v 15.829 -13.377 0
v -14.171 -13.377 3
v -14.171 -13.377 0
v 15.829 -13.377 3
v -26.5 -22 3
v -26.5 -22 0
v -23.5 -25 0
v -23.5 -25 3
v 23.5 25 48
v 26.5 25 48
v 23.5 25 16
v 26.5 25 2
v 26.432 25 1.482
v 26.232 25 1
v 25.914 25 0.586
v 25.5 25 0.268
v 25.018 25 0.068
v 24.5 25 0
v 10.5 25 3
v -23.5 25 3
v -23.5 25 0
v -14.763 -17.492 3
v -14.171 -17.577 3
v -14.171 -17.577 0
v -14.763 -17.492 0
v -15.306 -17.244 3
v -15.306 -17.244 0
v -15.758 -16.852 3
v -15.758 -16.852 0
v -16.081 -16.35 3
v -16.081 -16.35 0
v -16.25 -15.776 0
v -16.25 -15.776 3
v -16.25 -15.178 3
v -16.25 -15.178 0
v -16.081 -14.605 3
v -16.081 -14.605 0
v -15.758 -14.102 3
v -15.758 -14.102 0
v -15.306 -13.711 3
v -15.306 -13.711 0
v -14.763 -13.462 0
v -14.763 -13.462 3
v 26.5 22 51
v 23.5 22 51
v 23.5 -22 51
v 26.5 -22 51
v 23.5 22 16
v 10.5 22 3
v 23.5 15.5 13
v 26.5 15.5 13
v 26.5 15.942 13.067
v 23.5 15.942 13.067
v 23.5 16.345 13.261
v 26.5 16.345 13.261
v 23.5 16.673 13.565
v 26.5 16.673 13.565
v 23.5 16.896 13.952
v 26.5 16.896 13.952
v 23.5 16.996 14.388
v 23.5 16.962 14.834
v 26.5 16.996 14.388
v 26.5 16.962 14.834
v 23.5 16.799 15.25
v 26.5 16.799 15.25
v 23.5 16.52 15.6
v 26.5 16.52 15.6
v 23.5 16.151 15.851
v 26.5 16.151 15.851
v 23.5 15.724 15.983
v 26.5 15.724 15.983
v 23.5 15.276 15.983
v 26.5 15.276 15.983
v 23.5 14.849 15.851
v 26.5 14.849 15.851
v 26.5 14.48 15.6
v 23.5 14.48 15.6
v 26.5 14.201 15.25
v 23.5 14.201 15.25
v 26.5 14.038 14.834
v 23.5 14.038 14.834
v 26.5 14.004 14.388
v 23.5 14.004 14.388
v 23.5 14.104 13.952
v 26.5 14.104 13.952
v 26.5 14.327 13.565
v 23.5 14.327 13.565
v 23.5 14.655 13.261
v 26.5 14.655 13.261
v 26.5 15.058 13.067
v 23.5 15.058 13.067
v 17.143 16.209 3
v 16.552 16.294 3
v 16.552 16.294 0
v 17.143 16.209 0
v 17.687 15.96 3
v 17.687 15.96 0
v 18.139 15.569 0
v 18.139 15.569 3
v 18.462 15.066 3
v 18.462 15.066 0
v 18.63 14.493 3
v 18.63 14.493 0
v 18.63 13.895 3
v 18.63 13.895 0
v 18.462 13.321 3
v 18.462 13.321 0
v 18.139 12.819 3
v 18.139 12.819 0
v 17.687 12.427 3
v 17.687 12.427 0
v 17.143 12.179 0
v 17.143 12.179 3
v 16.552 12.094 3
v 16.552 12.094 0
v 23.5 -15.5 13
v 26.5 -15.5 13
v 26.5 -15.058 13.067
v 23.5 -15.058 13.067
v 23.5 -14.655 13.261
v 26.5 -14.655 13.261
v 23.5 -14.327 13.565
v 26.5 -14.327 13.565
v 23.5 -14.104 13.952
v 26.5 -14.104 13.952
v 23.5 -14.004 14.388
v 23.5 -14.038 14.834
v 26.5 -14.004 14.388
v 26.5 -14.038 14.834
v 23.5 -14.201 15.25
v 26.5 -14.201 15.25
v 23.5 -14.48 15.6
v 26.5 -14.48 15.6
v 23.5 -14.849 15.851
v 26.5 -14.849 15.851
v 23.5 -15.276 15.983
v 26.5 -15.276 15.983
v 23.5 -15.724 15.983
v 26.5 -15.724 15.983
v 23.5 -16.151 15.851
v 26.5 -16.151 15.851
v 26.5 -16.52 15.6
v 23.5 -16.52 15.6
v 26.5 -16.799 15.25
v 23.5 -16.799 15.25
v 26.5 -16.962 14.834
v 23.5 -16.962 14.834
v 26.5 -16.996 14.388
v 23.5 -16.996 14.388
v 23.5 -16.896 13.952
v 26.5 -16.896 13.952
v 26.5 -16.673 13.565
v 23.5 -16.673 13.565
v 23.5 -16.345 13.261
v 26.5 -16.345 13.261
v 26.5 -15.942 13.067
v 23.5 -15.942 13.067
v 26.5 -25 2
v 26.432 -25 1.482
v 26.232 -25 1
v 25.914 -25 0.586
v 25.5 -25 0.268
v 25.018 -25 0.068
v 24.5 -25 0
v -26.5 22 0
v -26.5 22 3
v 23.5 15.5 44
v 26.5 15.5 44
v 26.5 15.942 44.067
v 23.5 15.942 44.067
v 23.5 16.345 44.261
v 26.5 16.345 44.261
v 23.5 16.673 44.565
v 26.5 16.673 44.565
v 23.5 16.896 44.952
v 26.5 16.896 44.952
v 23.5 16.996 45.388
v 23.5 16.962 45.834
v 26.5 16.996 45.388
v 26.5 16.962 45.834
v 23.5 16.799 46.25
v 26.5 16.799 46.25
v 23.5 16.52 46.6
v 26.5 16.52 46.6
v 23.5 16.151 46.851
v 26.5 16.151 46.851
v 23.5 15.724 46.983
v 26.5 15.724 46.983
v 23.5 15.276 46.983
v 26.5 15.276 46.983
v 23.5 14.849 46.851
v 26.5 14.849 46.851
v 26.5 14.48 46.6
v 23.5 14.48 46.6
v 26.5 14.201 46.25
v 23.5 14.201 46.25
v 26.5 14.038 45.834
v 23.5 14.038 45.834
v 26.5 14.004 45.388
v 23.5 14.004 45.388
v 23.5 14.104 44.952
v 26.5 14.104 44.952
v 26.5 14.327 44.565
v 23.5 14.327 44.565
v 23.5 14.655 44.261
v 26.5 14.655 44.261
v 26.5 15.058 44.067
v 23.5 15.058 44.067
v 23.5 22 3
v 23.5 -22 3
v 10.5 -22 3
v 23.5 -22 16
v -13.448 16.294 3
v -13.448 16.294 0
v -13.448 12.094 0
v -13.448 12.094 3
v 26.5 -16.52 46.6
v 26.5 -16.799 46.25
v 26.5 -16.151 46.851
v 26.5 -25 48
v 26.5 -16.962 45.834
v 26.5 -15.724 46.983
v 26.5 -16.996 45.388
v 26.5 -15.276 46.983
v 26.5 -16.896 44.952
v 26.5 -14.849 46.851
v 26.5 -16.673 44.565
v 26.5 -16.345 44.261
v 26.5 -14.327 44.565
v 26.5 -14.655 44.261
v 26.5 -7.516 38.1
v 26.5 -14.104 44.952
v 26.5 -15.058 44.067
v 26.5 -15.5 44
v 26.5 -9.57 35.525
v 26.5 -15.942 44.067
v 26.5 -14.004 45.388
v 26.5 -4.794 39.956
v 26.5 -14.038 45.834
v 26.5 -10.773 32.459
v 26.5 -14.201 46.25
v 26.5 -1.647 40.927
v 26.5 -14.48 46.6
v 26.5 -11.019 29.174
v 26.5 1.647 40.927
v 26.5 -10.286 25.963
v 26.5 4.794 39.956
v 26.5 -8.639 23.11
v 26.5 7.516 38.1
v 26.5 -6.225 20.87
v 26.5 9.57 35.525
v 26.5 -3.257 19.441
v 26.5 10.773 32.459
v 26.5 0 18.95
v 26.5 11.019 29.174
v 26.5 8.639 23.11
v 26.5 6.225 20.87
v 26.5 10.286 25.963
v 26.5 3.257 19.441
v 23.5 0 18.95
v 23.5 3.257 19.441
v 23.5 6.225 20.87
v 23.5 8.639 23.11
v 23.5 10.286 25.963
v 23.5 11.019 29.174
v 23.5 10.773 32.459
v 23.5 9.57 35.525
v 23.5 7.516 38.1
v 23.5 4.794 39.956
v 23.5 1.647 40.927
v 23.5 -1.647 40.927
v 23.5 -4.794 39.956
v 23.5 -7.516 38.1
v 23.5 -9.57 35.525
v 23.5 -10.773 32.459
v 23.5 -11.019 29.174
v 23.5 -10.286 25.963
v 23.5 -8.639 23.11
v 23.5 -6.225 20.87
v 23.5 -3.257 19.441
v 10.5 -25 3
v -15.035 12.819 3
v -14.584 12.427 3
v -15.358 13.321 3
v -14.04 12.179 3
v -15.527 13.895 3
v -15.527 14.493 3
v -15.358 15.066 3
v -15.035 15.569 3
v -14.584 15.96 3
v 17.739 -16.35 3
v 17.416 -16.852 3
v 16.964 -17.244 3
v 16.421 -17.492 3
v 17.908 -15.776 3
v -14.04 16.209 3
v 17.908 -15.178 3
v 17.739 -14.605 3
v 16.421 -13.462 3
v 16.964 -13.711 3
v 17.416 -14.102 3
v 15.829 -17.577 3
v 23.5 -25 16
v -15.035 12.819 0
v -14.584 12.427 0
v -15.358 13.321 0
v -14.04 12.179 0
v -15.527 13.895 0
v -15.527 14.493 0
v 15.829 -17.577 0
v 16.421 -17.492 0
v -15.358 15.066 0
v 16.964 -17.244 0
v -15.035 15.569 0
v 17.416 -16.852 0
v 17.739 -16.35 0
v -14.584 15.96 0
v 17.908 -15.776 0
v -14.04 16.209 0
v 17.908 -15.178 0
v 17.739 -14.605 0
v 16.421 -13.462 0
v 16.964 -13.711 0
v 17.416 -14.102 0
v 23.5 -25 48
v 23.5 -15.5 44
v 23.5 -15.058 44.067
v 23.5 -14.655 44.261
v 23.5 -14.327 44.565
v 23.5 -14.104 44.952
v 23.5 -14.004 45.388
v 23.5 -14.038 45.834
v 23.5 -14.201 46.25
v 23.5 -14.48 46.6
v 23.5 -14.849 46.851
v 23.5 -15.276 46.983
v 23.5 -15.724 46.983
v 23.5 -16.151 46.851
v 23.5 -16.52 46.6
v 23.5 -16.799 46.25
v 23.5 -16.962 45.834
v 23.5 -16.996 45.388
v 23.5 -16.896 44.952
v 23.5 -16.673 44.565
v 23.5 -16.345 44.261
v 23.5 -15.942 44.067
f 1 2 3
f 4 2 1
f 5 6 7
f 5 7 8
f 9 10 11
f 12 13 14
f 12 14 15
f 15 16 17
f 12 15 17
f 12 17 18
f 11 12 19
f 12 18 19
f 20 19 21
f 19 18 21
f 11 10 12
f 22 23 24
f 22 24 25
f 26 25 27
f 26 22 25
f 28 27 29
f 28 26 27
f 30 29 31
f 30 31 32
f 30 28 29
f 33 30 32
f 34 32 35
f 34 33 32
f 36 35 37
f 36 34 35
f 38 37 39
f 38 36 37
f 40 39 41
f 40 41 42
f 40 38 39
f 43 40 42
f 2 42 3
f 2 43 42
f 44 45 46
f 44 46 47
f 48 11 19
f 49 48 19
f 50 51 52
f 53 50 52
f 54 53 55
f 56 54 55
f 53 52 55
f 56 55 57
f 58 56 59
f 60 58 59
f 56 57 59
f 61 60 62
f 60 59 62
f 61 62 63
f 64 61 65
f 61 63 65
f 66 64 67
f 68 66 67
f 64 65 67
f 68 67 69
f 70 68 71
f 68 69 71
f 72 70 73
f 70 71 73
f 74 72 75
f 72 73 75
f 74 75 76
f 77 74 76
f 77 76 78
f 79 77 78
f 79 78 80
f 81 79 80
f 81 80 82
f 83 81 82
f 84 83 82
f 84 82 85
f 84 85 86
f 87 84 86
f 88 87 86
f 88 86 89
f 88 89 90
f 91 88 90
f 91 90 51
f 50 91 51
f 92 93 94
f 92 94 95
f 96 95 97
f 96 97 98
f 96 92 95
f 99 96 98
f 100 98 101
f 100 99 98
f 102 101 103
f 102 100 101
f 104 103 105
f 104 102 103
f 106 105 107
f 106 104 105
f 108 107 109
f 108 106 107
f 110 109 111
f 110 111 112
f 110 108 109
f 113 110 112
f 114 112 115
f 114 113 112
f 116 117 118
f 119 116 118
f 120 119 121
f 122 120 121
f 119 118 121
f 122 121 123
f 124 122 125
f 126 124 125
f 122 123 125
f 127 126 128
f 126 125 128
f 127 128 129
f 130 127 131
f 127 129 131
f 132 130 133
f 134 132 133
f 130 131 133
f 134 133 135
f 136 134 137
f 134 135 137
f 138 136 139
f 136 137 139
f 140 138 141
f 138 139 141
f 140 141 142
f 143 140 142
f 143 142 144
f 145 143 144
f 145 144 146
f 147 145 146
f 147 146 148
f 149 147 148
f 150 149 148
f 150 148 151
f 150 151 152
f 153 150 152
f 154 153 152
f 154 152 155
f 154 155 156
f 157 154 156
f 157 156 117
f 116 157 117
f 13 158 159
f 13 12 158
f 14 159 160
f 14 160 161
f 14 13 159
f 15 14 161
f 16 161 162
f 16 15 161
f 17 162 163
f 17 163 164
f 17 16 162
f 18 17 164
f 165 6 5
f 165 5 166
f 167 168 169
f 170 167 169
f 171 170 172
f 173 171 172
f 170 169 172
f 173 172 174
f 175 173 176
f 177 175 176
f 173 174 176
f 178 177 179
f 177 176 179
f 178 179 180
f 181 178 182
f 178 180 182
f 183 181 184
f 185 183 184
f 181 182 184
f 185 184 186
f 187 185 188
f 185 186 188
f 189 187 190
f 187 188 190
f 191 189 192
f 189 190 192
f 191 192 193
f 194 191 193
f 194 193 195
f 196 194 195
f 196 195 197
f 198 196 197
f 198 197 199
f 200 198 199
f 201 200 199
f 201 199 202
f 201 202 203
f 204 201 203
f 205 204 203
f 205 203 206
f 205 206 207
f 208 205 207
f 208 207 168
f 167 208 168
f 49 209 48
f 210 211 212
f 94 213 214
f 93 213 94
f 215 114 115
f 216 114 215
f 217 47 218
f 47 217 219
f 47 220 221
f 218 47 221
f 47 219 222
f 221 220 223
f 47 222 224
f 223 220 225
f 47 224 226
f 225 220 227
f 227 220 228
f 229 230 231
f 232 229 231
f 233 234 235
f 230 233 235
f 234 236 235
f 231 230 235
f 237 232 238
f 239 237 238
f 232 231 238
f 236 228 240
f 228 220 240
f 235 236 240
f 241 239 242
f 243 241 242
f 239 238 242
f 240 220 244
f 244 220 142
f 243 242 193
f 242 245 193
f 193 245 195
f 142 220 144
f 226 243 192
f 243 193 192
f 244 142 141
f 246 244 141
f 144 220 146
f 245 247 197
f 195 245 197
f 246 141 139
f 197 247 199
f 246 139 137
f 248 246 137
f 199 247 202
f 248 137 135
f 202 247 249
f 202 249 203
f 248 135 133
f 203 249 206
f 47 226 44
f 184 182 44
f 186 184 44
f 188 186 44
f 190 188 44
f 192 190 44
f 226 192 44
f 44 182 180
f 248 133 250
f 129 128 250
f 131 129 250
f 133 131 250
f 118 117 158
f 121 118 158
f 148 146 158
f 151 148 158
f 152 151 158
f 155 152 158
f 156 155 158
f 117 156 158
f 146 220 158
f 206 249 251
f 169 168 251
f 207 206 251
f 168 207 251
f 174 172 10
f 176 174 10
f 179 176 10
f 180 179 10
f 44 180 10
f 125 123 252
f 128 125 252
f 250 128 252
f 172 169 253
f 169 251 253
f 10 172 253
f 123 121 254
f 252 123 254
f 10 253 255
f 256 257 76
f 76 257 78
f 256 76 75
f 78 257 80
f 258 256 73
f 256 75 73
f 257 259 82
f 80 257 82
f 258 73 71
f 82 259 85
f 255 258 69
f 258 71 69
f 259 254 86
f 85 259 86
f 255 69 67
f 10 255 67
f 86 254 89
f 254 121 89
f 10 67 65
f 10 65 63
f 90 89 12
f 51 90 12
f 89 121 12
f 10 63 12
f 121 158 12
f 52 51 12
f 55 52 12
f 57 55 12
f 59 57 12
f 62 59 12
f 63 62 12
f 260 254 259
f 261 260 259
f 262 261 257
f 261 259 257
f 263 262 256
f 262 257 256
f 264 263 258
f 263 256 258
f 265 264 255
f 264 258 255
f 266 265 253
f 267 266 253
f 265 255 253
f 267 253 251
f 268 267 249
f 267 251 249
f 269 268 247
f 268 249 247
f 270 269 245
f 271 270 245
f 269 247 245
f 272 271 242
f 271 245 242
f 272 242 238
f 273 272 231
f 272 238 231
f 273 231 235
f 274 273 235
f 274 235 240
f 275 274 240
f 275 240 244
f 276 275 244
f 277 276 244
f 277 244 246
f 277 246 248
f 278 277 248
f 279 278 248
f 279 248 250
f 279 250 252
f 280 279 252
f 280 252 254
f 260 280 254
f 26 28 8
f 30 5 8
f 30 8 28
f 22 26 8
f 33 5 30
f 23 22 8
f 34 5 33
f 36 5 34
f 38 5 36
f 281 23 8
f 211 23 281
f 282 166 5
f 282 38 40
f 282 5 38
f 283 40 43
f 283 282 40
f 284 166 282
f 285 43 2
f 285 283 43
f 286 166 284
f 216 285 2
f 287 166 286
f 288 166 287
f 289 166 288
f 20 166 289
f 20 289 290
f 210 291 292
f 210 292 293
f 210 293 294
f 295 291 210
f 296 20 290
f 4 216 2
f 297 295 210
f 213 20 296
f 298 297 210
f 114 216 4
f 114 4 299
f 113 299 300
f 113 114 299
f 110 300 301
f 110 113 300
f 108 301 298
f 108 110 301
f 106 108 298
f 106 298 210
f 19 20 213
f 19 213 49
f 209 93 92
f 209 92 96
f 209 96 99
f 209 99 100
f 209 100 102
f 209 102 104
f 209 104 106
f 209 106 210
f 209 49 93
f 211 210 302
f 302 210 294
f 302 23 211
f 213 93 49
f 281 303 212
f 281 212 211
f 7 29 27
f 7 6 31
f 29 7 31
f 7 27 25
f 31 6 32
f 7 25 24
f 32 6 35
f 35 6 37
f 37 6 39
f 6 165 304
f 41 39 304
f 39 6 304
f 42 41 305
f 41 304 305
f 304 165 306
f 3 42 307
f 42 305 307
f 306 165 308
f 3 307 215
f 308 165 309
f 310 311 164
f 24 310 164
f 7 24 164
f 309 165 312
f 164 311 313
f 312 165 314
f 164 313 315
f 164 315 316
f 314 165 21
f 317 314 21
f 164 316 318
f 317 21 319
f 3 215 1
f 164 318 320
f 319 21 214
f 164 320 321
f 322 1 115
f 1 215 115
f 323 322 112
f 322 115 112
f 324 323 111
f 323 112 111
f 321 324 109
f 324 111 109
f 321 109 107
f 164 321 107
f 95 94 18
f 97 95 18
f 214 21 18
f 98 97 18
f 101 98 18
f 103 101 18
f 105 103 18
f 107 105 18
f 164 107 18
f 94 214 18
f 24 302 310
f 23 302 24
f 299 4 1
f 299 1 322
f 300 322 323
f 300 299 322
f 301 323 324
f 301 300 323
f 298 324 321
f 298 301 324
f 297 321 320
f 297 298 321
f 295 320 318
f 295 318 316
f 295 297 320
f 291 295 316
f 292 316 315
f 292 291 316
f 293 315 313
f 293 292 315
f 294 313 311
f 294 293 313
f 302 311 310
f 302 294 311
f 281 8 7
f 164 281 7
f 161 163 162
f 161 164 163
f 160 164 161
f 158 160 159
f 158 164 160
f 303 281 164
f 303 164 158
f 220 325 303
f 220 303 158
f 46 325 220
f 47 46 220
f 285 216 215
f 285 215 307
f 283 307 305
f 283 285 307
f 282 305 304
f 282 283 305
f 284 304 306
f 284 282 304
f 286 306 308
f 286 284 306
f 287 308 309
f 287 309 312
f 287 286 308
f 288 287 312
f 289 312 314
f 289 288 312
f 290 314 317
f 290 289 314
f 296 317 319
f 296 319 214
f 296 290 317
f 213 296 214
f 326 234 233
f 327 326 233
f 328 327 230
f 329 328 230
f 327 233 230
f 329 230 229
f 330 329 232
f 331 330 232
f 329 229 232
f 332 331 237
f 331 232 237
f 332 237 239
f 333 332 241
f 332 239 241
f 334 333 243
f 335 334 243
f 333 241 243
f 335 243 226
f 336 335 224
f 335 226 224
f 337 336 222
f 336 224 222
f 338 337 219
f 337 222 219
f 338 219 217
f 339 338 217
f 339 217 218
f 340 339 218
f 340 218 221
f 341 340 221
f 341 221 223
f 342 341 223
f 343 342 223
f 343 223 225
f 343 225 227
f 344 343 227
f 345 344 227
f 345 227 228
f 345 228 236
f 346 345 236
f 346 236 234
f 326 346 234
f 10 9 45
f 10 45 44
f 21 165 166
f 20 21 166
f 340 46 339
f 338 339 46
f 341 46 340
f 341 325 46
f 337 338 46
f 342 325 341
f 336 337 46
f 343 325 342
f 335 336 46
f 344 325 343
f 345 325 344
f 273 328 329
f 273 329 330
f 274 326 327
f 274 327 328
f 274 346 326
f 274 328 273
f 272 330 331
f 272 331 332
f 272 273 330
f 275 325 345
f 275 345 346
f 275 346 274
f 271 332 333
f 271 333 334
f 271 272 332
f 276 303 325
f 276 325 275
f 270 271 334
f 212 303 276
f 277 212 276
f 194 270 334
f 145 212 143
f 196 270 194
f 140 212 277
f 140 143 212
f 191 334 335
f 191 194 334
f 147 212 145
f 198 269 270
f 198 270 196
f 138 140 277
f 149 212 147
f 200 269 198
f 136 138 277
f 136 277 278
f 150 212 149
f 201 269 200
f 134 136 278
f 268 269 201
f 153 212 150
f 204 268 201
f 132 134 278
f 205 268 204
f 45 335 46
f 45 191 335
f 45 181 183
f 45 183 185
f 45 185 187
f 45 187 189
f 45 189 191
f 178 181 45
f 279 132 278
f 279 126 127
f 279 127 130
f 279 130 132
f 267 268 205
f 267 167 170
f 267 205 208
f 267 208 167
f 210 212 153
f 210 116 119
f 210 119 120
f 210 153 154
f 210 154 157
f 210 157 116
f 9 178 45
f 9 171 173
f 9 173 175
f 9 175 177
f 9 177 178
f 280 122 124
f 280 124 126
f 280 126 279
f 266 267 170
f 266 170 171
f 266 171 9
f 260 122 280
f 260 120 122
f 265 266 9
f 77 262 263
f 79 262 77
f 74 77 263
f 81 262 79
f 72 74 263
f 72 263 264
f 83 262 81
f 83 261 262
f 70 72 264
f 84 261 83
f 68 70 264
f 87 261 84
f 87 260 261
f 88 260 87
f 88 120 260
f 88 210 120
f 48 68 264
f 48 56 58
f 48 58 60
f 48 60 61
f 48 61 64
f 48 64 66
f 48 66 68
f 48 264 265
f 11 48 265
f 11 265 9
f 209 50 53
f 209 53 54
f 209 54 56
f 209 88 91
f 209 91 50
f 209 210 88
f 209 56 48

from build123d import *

# Parameters (mm, degrees)
SZKIC5_W                    = 53
SZKIC5_H                    = 50
DODANIE_WYCI_GNI_CIE2_DEPTH = 3
SZKIC6_W                    = 3
SZKIC6_H                    = 50
DODANIE_WYCI_GNI_CIE3_DEPTH = 48
ZAOKR_GLENIE1_R             = 2
SFAZOWANIE2_SIZE            = 3
SFAZOWANIE4_SIZE            = 3
WYTNIJ_WYCI_GNI_CIE2_REACH  = 79.685
SZKIC7_R                    = 11.05
WYTNIJ_WYCI_GNI_CIE3_REACH  = 79.685
SZKIC9_R                    = 1.5
WYTNIJ_WYCI_GNI_CIE4_REACH  = 79.685
SZKIC10_R                   = 1.5
WYTNIJ_WYCI_GNI_CIE5_REACH  = 79.685
SZKIC11_R                   = 1.5
WYTNIJ_WYCI_GNI_CIE6_REACH  = 79.685
SZKIC12_R                   = 1.5
DODANIE_WYCI_GNI_CIE4_DEPTH = 3
DODANIE_WYCI_GNI_CIE5_DEPTH = 3
WYTNIJ_WYCI_GNI_CIE7_DEPTH  = 3


with BuildPart() as part:
    # Szkic5 → Dodanie-wyciągnięcie2 (new body)
    with BuildSketch(Plane.XY):
        Rectangle(SZKIC5_W, SZKIC5_H)
    extrude(amount=DODANIE_WYCI_GNI_CIE2_DEPTH)

    # Szkic6 → Dodanie-wyciągnięcie3 (add)
    with BuildSketch(Plane.XY.offset(3)):
        with Locations((25, 0)):
            Rectangle(SZKIC6_W, SZKIC6_H)
    extrude(amount=DODANIE_WYCI_GNI_CIE3_DEPTH)

    # Zaokrąglenie1
    zaokr_glenie1_edges = [part.edges().sort_by_distance(p)[0] for p in [
        (26.5, 0, 0),
    ]]
    fillet(zaokr_glenie1_edges, radius=ZAOKR_GLENIE1_R)

    # Sfazowanie2
    sfazowanie2_edges = [part.edges().sort_by_distance(p)[0] for p in [
        (25, -25, 51),
        (-26.5, -25, 1.5),
        (-26.5, 25, 1.5),
    ]]
    chamfer(sfazowanie2_edges, length=SFAZOWANIE2_SIZE)

    # Sfazowanie4
    sfazowanie4_edges = [part.edges().sort_by_distance(p)[0] for p in [
        (25, 25, 51),
    ]]
    chamfer(sfazowanie4_edges, length=SFAZOWANIE4_SIZE)

    # Szkic7 → Wytnij-wyciągnięcie2 (cut, up to next)
    with BuildSketch(Plane(origin=(26.5, 0, 0), x_dir=(0, 0, -1), z_dir=(1, 0, 0)), mode=Mode.PRIVATE) as wytnij_wyci_gni_cie2_sk1:
        with Locations((-30, 0)):
            Circle(SZKIC7_R)
    wytnij_wyci_gni_cie2_tool1 = extrude(wytnij_wyci_gni_cie2_sk1.sketch, amount=-WYTNIJ_WYCI_GNI_CIE2_REACH, mode=Mode.PRIVATE) & part.part
    add(wytnij_wyci_gni_cie2_tool1.solids().sort_by_distance((26.5, 0, 30))[0], mode=Mode.SUBTRACT)

    # Szkic9 → Wytnij-wyciągnięcie3 (cut, up to next)
    with BuildSketch(Plane(origin=(26.5, 0, 0), x_dir=(0, 0, -1), z_dir=(1, 0, 0)), mode=Mode.PRIVATE) as wytnij_wyci_gni_cie3_sk1:
        with Locations((-45.5, 15.5)):
            Circle(SZKIC9_R)
    wytnij_wyci_gni_cie3_tool1 = extrude(wytnij_wyci_gni_cie3_sk1.sketch, amount=-WYTNIJ_WYCI_GNI_CIE3_REACH, mode=Mode.PRIVATE) & part.part
    add(wytnij_wyci_gni_cie3_tool1.solids().sort_by_distance((26.5, 15.5, 45.5))[0], mode=Mode.SUBTRACT)

    # Szkic10 → Wytnij-wyciągnięcie4 (cut, up to next)
    with BuildSketch(Plane(origin=(26.5, 0, 0), x_dir=(0, 0, -1), z_dir=(1, 0, 0)), mode=Mode.PRIVATE) as wytnij_wyci_gni_cie4_sk1:
        with Locations((-45.5, -15.5)):
            Circle(SZKIC10_R)
    wytnij_wyci_gni_cie4_tool1 = extrude(wytnij_wyci_gni_cie4_sk1.sketch, amount=-WYTNIJ_WYCI_GNI_CIE4_REACH, mode=Mode.PRIVATE) & part.part
    add(wytnij_wyci_gni_cie4_tool1.solids().sort_by_distance((26.5, -15.5, 45.5))[0], mode=Mode.SUBTRACT)

    # Szkic11 → Wytnij-wyciągnięcie5 (cut, up to next)
    with BuildSketch(Plane(origin=(26.5, 0, 0), x_dir=(0, 0, -1), z_dir=(1, 0, 0)), mode=Mode.PRIVATE) as wytnij_wyci_gni_cie5_sk1:
        with Locations((-14.5, -15.5)):
            Circle(SZKIC11_R)
    wytnij_wyci_gni_cie5_tool1 = extrude(wytnij_wyci_gni_cie5_sk1.sketch, amount=-WYTNIJ_WYCI_GNI_CIE5_REACH, mode=Mode.PRIVATE) & part.part
    add(wytnij_wyci_gni_cie5_tool1.solids().sort_by_distance((26.5, -15.5, 14.5))[0], mode=Mode.SUBTRACT)

    # Szkic12 → Wytnij-wyciągnięcie6 (cut, up to next)
    with BuildSketch(Plane(origin=(26.5, 0, 0), x_dir=(0, 0, -1), z_dir=(1, 0, 0)), mode=Mode.PRIVATE) as wytnij_wyci_gni_cie6_sk1:
        with Locations((-14.5, 15.5)):
            Circle(SZKIC12_R)
    wytnij_wyci_gni_cie6_tool1 = extrude(wytnij_wyci_gni_cie6_sk1.sketch, amount=-WYTNIJ_WYCI_GNI_CIE6_REACH, mode=Mode.PRIVATE) & part.part
    add(wytnij_wyci_gni_cie6_tool1.solids().sort_by_distance((26.5, 15.5, 14.5))[0], mode=Mode.SUBTRACT)

    # Szkic15 → Dodanie-wyciągnięcie4 (add)
    with BuildSketch(Plane(origin=(0, 25, 0), x_dir=(1, 0, 0), z_dir=(0, 1, 0))):
        Polygon((23.5, -16), (10.5, -3), (23.5, -3), align=None)
    extrude(amount=-DODANIE_WYCI_GNI_CIE4_DEPTH)

    # Szkic16 → Dodanie-wyciągnięcie5 (add)
    with BuildSketch(Plane.XZ.offset(25)):
        Polygon((23.5, 3), (23.5, 16), (10.5, 3), align=None)
    extrude(amount=-DODANIE_WYCI_GNI_CIE5_DEPTH)

    # Szkic17 → Wytnij-wyciągnięcie7 (cut)
    with BuildSketch(Plane.XY.offset(3)):
        with BuildLine():
            Line((16.551792378, 12.093759381), (-13.448207622, 12.093759381))
            ThreePointArc((-13.448207622, 12.093759381), (-15.548207622, 14.193759381), (-13.448207622, 16.293759381))
            Line((-13.448207622, 16.293759381), (16.551792378, 16.293759381))
            ThreePointArc((16.551792378, 16.293759381), (18.651792378, 14.193759381), (16.551792378, 12.093759381))
        make_face()
        with BuildLine():
            Line((15.82894882, -17.577234295), (-14.17105118, -17.577234295))
            ThreePointArc((-14.17105118, -17.577234295), (-16.27105118, -15.477234295), (-14.17105118, -13.377234295))
            Line((-14.17105118, -13.377234295), (15.82894882, -13.377234295))
            ThreePointArc((15.82894882, -13.377234295), (17.92894882, -15.477234295), (15.82894882, -17.577234295))
        make_face()
    extrude(amount=-WYTNIJ_WYCI_GNI_CIE7_DEPTH, mode=Mode.SUBTRACT)


solid = part.part
